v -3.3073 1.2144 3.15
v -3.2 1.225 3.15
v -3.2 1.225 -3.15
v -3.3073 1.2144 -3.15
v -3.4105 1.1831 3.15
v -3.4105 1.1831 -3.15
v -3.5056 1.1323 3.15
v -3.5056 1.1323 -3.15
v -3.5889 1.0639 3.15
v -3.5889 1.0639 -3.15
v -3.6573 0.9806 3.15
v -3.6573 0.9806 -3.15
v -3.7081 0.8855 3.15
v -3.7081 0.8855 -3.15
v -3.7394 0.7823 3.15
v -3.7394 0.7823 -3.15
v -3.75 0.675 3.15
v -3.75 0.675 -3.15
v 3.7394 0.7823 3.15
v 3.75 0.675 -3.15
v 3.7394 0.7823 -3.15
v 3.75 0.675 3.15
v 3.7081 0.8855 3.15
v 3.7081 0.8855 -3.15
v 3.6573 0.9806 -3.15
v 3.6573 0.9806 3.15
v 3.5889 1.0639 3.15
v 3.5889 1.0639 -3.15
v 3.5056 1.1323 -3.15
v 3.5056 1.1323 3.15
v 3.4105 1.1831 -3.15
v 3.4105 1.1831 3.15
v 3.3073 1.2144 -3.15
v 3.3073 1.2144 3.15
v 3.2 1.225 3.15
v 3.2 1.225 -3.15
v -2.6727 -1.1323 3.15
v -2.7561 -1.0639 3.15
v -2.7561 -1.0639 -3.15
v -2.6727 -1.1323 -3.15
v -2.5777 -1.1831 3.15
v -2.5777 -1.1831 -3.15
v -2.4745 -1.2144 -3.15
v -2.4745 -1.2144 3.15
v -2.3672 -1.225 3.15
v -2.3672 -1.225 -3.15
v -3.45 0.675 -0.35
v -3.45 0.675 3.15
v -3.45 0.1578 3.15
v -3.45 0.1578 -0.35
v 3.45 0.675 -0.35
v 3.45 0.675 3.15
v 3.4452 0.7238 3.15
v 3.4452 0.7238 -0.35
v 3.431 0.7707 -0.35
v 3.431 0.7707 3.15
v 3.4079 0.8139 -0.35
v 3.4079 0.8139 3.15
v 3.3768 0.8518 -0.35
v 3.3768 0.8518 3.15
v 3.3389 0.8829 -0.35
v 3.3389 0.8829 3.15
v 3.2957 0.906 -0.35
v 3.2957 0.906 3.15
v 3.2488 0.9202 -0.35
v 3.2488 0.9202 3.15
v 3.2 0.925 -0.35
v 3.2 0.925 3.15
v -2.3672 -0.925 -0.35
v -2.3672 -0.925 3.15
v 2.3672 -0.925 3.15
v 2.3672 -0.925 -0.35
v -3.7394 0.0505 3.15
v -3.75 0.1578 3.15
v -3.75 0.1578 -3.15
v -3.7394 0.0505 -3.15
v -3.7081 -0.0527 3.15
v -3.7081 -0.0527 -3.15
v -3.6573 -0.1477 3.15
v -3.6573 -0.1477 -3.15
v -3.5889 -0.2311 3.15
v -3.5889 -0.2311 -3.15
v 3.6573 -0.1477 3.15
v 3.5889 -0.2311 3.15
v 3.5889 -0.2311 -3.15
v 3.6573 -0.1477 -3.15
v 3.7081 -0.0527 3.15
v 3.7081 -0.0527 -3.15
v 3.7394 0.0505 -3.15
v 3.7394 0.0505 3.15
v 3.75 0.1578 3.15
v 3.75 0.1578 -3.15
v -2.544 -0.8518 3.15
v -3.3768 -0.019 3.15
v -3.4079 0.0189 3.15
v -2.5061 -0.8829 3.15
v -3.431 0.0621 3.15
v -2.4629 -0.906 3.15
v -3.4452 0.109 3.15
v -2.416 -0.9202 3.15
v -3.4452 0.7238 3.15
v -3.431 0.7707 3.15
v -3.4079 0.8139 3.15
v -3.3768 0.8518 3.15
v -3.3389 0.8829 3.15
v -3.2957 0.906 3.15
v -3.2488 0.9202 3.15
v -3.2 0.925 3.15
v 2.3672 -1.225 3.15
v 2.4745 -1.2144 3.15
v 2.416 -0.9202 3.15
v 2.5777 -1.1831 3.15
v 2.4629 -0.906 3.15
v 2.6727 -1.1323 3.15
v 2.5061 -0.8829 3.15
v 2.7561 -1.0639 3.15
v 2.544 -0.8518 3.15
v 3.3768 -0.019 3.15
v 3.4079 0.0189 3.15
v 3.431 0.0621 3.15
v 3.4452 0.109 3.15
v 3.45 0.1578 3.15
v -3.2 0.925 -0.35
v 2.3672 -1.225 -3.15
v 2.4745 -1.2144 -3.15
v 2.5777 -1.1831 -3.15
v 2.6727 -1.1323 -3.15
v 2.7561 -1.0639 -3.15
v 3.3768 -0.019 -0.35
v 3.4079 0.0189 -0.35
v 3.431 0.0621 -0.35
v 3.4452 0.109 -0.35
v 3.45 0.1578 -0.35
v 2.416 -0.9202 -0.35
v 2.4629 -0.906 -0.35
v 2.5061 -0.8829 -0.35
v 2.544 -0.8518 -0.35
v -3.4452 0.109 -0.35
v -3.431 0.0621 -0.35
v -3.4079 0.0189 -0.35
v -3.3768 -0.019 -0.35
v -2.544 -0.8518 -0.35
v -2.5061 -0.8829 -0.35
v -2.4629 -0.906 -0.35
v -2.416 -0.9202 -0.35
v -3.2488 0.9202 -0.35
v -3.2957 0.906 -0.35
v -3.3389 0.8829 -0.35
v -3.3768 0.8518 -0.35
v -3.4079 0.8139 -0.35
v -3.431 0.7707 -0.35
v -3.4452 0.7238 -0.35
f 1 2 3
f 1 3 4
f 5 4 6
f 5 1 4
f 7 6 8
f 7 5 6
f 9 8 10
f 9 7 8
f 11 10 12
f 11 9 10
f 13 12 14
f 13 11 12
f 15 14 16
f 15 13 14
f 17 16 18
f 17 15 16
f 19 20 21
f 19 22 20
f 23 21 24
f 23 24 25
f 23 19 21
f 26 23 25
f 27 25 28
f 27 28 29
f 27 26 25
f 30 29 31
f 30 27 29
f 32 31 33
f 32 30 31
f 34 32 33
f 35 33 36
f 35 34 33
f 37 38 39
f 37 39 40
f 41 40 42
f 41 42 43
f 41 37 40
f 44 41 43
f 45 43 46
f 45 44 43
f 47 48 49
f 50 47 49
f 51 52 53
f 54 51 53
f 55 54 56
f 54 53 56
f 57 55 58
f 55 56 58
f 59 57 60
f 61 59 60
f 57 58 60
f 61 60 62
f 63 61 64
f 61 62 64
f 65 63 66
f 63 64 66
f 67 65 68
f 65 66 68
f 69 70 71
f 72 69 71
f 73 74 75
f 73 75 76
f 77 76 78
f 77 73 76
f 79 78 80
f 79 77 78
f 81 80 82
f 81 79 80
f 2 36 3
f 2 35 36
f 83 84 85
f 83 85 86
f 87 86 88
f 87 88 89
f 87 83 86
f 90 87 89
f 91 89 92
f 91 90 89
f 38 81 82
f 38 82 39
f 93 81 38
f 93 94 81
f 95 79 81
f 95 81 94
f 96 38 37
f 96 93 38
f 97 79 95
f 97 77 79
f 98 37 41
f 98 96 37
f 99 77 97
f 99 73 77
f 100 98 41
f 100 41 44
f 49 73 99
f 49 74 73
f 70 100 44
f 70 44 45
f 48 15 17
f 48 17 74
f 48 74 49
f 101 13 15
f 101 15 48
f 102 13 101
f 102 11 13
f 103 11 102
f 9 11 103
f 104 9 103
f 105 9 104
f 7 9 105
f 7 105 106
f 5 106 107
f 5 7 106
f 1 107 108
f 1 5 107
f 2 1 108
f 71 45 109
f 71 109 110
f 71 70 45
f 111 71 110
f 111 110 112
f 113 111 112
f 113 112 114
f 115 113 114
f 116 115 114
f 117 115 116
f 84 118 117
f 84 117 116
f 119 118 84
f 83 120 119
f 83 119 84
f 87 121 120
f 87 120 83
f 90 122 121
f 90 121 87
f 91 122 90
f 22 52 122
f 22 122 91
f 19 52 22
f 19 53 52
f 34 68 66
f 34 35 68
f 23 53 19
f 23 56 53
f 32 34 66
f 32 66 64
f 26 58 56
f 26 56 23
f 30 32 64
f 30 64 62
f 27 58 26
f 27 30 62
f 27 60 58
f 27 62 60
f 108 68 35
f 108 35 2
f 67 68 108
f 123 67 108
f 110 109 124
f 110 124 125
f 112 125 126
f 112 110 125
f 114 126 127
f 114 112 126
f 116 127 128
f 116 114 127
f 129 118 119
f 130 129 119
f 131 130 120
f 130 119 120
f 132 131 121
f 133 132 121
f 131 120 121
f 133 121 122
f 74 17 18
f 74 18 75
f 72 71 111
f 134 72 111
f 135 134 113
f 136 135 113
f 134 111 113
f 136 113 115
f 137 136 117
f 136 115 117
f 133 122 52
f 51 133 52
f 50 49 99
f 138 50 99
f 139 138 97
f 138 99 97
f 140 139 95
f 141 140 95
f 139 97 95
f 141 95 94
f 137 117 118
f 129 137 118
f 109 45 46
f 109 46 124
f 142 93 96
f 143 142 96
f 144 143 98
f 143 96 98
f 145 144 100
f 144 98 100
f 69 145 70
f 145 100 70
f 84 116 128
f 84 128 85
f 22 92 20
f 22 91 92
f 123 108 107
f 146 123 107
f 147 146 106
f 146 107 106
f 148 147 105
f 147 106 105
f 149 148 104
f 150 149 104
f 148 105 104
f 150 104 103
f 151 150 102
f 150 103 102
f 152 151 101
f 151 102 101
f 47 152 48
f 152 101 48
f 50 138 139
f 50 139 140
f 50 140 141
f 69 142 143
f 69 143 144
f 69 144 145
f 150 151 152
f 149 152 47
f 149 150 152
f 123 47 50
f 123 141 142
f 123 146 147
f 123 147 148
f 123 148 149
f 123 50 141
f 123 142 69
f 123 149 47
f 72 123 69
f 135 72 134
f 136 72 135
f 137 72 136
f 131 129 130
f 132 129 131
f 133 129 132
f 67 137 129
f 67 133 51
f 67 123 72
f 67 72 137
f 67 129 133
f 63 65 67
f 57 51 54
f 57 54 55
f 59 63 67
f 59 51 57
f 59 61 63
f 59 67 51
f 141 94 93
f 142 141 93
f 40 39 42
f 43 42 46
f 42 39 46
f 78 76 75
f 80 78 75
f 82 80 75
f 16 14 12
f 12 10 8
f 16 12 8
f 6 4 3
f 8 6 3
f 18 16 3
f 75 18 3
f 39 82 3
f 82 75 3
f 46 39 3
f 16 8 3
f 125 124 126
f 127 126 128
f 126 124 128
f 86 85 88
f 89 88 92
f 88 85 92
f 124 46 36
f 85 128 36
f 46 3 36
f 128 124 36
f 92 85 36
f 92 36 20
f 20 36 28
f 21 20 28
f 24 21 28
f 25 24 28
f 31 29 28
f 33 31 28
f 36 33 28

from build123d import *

# Parameters (mm, degrees)
RESSALTO_EXTRUS_O1_DEPTH = 3.15
ESBO_O2_OUTSIDE_W        = 11.52
ESBO_O2_OUTSIDE_H        = 6.47
CORTE_EXTRUS_O1_DEPTH    = 3.5


with BuildPart() as part:
    # Esboço1 → Ressalto-extrusão1 (new, symmetric)
    with BuildSketch(Plane.XY):
        with BuildLine():
            Line((3.2, 1.225), (-3.2, 1.225))
            ThreePointArc((-3.2, 1.225), (-3.58890873, 1.06390873), (-3.75, 0.675))
            Line((-3.75, 0.675), (-3.75, 0.157817459))
            ThreePointArc((-3.75, 0.157817459), (-3.708133743, -0.052658428), (-3.58890873, -0.23109127))
            Line((-3.58890873, -0.23109127), (-2.75609127, -1.06390873))
            ThreePointArc((-2.75609127, -1.06390873), (-2.577658428, -1.183133743), (-2.367182541, -1.225))
            Line((-2.367182541, -1.225), (2.367182541, -1.225))
            ThreePointArc((2.367182541, -1.225), (2.577658428, -1.183133743), (2.75609127, -1.06390873))
            Line((2.75609127, -1.06390873), (3.58890873, -0.23109127))
            ThreePointArc((3.58890873, -0.23109127), (3.708133743, -0.052658428), (3.75, 0.157817459))
            Line((3.75, 0.157817459), (3.75, 0.675))
            ThreePointArc((3.75, 0.675), (3.58890873, 1.06390873), (3.2, 1.225))
        make_face()
    extrude(amount=RESSALTO_EXTRUS_O1_DEPTH, both=True)

    # Esboço2 outside → Corte-extrusão1 (cut)
    # profile 1 of 2: a face of its own
    with BuildSketch(Plane.XY.offset(3.15)):
        Rectangle(ESBO_O2_OUTSIDE_W, ESBO_O2_OUTSIDE_H)
        with BuildLine():
            Line((2.75609127, -1.06390873), (3.58890873, -0.23109127))
            ThreePointArc((3.58890873, -0.23109127), (3.708133743, -0.052658428), (3.75, 0.157817459))
            Line((3.75, 0.157817459), (3.75, 0.675))
            ThreePointArc((3.75, 0.675), (3.58890873, 1.06390873), (3.2, 1.225))
            Line((3.2, 1.225), (-3.2, 1.225))
            ThreePointArc((-3.2, 1.225), (-3.58890873, 1.06390873), (-3.75, 0.675))
            Line((-3.75, 0.675), (-3.75, 0.157817459))
            ThreePointArc((-3.75, 0.157817459), (-3.708133743, -0.052658428), (-3.58890873, -0.23109127))
            Line((-3.58890873, -0.23109127), (-2.75609127, -1.06390873))
            ThreePointArc((-2.75609127, -1.06390873), (-2.577658428, -1.183133743), (-2.367182541, -1.225))
            Line((-2.367182541, -1.225), (2.367182541, -1.225))
            ThreePointArc((2.367182541, -1.225), (2.577658428, -1.183133743), (2.75609127, -1.06390873))
        make_face(mode=Mode.SUBTRACT)
    # profile 2 of 2: a face of its own
    with BuildSketch(Plane.XY.offset(3.15)):
        with BuildLine():
            Line((-3.45, 0.675), (-3.45, 0.157817459))
            ThreePointArc((-3.45, 0.157817459), (-3.430969883, 0.062146601), (-3.376776695, -0.018959236))
            Line((-3.376776695, -0.018959236), (-2.543959236, -0.851776695))
            ThreePointArc((-2.543959236, -0.851776695), (-2.462853399, -0.905969883), (-2.367182541, -0.925))
            Line((-2.367182541, -0.925), (2.367182541, -0.925))
            ThreePointArc((2.367182541, -0.925), (2.462853399, -0.905969883), (2.543959236, -0.851776695))
            Line((2.543959236, -0.851776695), (3.376776695, -0.018959236))
            ThreePointArc((3.376776695, -0.018959236), (3.430969883, 0.062146601), (3.45, 0.157817459))
            Line((3.45, 0.157817459), (3.45, 0.675))
            ThreePointArc((3.45, 0.675), (3.376776695, 0.851776695), (3.2, 0.925))
            Line((3.2, 0.925), (-3.2, 0.925))
            ThreePointArc((-3.2, 0.925), (-3.376776695, 0.851776695), (-3.45, 0.675))
        make_face()
    extrude(amount=-CORTE_EXTRUS_O1_DEPTH, mode=Mode.SUBTRACT)


solid = part.part
